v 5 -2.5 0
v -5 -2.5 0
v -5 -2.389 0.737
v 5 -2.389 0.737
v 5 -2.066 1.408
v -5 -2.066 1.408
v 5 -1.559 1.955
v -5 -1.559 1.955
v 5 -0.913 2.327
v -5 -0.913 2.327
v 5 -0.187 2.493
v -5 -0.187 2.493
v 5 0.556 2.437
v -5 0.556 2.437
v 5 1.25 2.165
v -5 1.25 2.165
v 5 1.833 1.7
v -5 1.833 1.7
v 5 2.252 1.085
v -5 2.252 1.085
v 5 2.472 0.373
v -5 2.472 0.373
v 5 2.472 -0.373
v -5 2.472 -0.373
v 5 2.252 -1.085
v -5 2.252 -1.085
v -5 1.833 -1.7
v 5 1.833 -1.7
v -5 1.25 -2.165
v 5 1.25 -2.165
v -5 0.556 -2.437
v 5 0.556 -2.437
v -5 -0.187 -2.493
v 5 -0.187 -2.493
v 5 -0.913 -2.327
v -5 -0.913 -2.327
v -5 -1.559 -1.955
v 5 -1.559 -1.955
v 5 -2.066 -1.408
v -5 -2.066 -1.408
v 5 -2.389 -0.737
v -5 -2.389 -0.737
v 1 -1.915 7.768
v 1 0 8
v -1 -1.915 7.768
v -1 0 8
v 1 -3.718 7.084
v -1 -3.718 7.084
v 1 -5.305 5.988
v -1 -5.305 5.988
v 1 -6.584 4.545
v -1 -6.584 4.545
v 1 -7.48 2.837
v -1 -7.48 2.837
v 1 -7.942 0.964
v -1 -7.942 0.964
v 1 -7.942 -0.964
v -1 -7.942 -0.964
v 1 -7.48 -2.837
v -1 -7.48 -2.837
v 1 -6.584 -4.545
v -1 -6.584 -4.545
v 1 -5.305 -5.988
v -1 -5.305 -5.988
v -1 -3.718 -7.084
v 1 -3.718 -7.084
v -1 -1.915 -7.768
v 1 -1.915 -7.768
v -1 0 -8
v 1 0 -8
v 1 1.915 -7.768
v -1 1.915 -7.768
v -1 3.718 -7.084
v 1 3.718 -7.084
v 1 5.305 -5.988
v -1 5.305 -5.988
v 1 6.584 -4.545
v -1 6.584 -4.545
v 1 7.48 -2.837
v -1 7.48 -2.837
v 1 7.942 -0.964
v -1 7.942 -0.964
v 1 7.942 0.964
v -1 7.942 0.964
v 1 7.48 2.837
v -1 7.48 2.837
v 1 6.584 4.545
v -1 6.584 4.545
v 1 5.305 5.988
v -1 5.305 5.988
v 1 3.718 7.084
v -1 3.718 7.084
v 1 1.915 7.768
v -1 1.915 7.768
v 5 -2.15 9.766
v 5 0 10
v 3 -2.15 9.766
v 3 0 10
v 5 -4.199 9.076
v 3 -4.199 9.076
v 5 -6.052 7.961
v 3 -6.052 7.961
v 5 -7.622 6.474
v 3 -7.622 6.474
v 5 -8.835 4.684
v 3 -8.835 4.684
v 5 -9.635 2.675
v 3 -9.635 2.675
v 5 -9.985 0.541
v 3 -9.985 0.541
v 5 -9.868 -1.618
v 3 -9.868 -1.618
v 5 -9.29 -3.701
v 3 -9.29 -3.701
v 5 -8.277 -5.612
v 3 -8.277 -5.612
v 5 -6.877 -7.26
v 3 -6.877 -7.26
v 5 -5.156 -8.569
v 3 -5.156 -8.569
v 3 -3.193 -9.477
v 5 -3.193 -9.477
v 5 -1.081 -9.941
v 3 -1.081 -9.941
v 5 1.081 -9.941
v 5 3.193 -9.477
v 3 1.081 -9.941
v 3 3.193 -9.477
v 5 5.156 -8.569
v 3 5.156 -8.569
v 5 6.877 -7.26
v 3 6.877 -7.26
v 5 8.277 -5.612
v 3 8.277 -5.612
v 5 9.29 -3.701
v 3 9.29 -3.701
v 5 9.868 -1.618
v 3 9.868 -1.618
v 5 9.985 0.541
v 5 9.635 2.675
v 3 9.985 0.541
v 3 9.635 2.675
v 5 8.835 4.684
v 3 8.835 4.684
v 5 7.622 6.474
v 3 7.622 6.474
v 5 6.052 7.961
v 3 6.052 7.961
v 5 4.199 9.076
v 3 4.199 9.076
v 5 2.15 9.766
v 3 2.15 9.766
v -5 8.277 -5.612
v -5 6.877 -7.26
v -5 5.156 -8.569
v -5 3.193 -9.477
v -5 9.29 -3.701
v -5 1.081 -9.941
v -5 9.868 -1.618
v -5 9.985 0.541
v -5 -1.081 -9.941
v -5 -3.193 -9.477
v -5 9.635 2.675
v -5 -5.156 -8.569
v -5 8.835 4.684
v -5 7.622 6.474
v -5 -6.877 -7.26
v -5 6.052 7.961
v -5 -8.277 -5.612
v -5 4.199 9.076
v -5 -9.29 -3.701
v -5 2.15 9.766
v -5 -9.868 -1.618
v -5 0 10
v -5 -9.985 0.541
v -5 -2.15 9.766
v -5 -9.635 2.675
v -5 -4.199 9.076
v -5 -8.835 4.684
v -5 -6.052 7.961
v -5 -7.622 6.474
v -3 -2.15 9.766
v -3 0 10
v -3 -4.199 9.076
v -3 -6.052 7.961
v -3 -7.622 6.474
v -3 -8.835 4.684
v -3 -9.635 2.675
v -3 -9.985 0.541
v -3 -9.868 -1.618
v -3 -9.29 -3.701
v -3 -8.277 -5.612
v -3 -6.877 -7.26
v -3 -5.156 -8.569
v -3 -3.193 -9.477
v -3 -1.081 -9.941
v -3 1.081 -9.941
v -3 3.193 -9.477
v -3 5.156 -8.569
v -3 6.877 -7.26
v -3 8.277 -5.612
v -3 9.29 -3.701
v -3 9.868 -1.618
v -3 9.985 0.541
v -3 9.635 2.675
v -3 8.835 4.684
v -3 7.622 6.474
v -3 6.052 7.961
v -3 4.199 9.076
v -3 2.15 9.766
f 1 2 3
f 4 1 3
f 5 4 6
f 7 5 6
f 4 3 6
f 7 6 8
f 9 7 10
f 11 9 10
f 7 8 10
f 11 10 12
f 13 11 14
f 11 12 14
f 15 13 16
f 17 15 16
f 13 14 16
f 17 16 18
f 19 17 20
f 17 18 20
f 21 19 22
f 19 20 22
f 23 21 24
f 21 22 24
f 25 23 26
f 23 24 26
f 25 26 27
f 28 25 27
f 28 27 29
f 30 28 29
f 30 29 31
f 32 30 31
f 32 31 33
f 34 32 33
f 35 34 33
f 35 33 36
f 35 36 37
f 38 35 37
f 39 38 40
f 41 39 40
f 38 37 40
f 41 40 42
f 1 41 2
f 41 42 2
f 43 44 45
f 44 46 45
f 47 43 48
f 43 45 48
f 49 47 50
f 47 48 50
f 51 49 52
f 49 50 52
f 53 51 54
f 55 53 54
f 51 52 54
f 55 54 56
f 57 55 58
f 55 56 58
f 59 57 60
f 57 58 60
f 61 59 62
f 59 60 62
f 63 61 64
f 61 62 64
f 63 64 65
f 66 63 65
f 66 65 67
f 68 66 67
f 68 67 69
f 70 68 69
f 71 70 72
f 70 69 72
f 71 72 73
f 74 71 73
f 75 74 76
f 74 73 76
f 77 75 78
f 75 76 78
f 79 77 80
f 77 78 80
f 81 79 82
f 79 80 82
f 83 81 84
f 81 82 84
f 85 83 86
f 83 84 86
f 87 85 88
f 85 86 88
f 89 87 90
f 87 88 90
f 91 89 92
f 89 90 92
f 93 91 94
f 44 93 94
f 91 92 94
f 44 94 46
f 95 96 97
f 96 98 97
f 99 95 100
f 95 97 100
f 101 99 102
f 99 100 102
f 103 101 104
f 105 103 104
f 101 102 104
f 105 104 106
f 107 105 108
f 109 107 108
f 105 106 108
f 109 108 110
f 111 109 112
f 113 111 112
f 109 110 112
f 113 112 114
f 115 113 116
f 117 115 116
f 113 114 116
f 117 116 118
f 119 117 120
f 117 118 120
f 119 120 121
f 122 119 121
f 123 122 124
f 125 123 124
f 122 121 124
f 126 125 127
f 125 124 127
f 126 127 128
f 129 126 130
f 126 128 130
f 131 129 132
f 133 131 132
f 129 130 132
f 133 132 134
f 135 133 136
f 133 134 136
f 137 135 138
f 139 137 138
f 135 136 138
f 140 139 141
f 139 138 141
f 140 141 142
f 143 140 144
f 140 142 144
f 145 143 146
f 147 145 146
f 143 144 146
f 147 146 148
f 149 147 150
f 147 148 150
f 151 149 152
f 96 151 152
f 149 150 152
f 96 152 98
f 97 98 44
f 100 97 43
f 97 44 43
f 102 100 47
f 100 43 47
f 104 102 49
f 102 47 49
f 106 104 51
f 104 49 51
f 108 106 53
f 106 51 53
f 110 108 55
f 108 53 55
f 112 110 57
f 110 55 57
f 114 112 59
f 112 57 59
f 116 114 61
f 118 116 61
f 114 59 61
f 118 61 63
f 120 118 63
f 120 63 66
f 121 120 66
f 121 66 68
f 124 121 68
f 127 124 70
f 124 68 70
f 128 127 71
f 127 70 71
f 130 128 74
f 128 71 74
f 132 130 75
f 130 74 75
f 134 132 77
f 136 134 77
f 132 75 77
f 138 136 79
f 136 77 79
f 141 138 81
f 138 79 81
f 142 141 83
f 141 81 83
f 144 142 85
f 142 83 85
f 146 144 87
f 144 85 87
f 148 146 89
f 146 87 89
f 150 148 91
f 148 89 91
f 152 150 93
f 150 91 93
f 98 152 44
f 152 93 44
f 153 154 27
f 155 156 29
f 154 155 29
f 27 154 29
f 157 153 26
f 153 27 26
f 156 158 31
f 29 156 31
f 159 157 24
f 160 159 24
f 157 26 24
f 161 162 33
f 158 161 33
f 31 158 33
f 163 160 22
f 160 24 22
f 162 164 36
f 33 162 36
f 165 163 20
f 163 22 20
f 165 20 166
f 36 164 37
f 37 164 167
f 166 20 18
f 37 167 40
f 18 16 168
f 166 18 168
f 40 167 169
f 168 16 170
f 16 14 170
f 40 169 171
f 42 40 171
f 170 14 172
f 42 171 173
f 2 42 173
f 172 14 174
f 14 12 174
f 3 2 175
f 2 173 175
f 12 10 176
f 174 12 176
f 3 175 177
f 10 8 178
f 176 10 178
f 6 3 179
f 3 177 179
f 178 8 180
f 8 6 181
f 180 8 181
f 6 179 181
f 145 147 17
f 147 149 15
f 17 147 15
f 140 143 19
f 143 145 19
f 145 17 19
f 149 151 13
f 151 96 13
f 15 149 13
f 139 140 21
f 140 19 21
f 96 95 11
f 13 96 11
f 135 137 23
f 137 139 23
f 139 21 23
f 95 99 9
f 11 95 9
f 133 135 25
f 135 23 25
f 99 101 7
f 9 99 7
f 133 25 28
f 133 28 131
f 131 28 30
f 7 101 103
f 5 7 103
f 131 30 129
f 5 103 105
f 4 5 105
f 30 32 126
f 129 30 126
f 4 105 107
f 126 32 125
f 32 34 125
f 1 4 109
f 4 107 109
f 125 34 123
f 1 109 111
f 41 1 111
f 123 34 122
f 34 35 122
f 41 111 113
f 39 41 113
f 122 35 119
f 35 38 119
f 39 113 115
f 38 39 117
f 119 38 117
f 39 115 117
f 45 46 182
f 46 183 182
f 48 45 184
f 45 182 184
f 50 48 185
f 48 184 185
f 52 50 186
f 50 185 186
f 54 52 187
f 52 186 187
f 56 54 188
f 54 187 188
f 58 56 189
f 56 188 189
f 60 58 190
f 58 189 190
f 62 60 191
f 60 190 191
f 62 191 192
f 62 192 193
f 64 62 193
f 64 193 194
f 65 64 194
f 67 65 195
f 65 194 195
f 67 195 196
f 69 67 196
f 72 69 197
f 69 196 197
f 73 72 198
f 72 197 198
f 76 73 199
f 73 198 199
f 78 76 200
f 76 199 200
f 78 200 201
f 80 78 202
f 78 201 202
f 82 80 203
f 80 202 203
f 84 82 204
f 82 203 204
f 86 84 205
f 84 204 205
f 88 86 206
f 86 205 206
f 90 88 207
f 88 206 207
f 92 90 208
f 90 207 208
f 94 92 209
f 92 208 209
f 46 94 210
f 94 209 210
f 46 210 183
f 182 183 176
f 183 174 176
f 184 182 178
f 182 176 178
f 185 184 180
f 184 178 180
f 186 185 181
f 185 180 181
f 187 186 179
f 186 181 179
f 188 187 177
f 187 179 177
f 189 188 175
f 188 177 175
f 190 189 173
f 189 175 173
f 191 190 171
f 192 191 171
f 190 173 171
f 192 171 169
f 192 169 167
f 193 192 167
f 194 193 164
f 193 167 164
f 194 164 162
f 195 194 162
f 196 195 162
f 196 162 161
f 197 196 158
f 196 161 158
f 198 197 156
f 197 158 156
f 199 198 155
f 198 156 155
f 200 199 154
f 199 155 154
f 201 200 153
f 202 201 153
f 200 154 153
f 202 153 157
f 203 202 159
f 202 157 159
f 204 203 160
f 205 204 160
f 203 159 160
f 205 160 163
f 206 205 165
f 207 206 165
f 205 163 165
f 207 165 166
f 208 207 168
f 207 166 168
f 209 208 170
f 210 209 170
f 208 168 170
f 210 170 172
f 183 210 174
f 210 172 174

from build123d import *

# Parameters (mm, degrees)
F2_R     = 2.5
F3_DEPTH = 10


with BuildPart() as f1:
    # F0 (on Front) → F1 (revolve)
    with BuildSketch(Plane.XZ):
        Polygon((3, 10), (1, 8), (-1, 8), (-3, 10), (-5, 10), (-5, 0), (5, 0), (5, 10), align=None)
    revolve(axis=Axis((0, 0, 0), (1, 0, 0)))

    # F2 (on face) → F3 (cut, through all)
    with BuildSketch(Plane(origin=(-5, 0, 0), x_dir=(0, -1, 0), z_dir=(-1, 0, 0))):
        Circle(F2_R)
    extrude(amount=-F3_DEPTH, mode=Mode.SUBTRACT)


solid = f1.part
